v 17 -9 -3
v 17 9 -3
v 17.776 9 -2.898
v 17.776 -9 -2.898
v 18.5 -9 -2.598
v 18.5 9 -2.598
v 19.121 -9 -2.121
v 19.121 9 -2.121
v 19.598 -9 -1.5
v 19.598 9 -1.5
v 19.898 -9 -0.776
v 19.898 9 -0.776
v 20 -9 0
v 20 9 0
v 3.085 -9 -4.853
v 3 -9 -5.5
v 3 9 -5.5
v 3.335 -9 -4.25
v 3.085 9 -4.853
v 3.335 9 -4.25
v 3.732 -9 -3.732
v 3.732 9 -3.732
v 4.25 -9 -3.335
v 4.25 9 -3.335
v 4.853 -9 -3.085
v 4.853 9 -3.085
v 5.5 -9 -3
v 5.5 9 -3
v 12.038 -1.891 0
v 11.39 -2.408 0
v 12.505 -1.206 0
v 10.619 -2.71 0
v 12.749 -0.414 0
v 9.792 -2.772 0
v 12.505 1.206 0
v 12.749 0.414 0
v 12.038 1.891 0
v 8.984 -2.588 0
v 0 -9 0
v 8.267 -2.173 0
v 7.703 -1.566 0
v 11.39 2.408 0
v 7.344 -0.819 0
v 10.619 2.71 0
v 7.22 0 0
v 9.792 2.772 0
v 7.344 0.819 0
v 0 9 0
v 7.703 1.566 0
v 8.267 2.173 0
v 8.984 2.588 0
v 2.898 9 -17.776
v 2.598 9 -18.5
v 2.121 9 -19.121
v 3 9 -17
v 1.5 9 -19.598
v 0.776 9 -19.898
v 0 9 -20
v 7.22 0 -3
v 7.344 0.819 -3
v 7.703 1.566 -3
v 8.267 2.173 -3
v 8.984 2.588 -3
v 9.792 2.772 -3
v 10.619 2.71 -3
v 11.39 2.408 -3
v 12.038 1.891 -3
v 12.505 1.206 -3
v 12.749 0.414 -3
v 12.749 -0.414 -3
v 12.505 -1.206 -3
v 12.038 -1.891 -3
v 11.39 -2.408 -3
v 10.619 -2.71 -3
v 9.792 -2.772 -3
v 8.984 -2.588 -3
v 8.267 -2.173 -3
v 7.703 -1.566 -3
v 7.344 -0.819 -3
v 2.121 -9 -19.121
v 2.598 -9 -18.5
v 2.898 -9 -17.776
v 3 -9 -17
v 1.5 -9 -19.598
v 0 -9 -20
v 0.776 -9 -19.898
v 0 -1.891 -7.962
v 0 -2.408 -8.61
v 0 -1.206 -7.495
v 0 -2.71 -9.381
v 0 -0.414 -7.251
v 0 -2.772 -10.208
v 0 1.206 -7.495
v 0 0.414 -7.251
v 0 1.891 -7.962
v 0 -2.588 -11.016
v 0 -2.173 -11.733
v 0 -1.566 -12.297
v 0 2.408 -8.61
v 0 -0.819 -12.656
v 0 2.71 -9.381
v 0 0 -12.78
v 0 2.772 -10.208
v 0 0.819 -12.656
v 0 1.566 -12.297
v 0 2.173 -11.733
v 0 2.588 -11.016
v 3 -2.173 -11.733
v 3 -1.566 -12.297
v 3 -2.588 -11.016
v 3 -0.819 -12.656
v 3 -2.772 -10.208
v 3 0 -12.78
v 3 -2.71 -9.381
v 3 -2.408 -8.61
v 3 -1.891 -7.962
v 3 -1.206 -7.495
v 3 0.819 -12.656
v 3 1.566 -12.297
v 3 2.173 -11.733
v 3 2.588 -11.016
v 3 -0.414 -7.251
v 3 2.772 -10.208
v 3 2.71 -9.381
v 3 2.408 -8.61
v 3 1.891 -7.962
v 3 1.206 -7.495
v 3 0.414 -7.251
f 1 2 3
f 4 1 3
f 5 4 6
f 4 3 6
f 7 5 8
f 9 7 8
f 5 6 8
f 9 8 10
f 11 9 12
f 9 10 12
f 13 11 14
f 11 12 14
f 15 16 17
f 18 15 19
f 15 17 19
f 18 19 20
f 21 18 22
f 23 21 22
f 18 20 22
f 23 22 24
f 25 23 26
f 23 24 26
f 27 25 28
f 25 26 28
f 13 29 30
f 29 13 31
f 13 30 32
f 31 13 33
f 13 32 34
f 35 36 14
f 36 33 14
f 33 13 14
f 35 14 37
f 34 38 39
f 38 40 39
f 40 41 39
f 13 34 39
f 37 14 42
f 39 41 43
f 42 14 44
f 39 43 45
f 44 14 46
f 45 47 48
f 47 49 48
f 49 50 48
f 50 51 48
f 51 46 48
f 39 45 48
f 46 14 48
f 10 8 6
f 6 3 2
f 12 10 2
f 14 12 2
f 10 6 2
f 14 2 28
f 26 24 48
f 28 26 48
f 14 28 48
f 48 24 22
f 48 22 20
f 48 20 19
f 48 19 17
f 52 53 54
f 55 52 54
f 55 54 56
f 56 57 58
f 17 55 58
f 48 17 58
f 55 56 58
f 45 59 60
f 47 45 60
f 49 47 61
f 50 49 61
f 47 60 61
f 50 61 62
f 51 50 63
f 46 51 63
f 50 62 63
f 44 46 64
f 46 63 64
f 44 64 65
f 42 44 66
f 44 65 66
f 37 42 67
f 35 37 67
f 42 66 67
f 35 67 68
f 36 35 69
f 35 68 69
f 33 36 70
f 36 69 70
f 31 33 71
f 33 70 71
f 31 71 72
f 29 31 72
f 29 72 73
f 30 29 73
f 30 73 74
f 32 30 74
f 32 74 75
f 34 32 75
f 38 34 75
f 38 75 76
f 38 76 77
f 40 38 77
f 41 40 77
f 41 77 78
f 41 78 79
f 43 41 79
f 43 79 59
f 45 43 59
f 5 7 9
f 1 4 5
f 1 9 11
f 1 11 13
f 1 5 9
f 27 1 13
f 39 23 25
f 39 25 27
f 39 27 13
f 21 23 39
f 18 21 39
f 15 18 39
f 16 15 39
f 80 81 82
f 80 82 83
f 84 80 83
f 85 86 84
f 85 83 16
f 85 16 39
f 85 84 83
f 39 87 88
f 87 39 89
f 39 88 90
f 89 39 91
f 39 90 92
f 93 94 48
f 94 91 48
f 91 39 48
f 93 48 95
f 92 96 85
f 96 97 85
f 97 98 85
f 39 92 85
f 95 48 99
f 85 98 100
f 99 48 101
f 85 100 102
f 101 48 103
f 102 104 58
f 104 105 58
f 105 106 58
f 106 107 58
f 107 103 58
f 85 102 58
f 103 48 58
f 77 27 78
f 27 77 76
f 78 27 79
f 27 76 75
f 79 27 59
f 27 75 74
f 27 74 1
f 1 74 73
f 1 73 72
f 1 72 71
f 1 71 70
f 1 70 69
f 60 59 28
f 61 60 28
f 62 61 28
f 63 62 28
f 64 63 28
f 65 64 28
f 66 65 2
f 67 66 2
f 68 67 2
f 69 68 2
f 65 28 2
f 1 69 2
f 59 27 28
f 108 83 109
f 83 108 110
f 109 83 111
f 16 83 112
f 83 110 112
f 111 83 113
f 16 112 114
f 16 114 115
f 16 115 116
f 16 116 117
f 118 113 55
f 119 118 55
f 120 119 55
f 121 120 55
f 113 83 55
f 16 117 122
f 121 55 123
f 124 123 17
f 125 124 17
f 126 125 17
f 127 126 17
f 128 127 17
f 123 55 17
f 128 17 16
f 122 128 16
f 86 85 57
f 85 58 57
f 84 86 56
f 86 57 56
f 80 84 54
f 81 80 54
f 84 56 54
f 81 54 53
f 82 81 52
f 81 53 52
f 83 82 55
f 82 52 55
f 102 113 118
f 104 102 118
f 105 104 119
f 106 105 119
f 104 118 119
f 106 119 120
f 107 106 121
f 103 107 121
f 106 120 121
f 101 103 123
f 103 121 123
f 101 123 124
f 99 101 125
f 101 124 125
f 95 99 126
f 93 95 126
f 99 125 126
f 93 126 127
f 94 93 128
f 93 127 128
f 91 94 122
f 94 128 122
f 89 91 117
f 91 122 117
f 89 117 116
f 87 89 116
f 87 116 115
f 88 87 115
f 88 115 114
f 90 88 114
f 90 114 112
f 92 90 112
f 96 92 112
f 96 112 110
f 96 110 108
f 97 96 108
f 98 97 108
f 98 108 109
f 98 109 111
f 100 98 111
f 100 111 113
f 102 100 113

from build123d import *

# Parameters (mm, degrees)
BOSS_EXTRUDE1_DEPTH = 9
SKETCH2_R           = 2.78
CUT_EXTRUDE1_DEPTH  = 28.748873851
SKETCH3_R           = 2.78
CUT_EXTRUDE2_DEPTH  = 28.748873851


with BuildPart() as part:
    # Sketch1 → Boss-Extrude1 (new, symmetric)
    with BuildSketch(Plane(origin=(0, 0, 0), x_dir=(1, 0, 0), z_dir=(0, 1, 0))):
        with BuildLine():
            Line((0, 0), (0, 20))
            ThreePointArc((0, 20), (2.121320344, 19.121320344), (3, 17))
            Line((3, 17), (3, 5.5))
            ThreePointArc((3, 5.5), (3.732233047, 3.732233047), (5.5, 3))
            Line((5.5, 3), (17, 3))
            ThreePointArc((17, 3), (19.121320344, 2.121320344), (20, 0))
            Line((20, 0), (0, 0))
        make_face()
    extrude(amount=BOSS_EXTRUDE1_DEPTH, both=True)

    # Sketch2 → Cut-Extrude1 (cut, through all)
    with BuildSketch(Plane(origin=(0, 0, -3), x_dir=(-1, 0, 0), z_dir=(0, 0, -1))):
        with Locations((-10, 0)):
            Circle(SKETCH2_R)
    extrude(amount=-CUT_EXTRUDE1_DEPTH, mode=Mode.SUBTRACT)

    # Sketch3 → Cut-Extrude2 (cut, through all)
    with BuildSketch(Plane(origin=(3, 0, 0), x_dir=(0, 0, -1), z_dir=(1, 0, 0))):
        with Locations((10, 0)):
            Circle(SKETCH3_R)
    extrude(amount=-CUT_EXTRUDE2_DEPTH, mode=Mode.SUBTRACT)


solid = part.part
